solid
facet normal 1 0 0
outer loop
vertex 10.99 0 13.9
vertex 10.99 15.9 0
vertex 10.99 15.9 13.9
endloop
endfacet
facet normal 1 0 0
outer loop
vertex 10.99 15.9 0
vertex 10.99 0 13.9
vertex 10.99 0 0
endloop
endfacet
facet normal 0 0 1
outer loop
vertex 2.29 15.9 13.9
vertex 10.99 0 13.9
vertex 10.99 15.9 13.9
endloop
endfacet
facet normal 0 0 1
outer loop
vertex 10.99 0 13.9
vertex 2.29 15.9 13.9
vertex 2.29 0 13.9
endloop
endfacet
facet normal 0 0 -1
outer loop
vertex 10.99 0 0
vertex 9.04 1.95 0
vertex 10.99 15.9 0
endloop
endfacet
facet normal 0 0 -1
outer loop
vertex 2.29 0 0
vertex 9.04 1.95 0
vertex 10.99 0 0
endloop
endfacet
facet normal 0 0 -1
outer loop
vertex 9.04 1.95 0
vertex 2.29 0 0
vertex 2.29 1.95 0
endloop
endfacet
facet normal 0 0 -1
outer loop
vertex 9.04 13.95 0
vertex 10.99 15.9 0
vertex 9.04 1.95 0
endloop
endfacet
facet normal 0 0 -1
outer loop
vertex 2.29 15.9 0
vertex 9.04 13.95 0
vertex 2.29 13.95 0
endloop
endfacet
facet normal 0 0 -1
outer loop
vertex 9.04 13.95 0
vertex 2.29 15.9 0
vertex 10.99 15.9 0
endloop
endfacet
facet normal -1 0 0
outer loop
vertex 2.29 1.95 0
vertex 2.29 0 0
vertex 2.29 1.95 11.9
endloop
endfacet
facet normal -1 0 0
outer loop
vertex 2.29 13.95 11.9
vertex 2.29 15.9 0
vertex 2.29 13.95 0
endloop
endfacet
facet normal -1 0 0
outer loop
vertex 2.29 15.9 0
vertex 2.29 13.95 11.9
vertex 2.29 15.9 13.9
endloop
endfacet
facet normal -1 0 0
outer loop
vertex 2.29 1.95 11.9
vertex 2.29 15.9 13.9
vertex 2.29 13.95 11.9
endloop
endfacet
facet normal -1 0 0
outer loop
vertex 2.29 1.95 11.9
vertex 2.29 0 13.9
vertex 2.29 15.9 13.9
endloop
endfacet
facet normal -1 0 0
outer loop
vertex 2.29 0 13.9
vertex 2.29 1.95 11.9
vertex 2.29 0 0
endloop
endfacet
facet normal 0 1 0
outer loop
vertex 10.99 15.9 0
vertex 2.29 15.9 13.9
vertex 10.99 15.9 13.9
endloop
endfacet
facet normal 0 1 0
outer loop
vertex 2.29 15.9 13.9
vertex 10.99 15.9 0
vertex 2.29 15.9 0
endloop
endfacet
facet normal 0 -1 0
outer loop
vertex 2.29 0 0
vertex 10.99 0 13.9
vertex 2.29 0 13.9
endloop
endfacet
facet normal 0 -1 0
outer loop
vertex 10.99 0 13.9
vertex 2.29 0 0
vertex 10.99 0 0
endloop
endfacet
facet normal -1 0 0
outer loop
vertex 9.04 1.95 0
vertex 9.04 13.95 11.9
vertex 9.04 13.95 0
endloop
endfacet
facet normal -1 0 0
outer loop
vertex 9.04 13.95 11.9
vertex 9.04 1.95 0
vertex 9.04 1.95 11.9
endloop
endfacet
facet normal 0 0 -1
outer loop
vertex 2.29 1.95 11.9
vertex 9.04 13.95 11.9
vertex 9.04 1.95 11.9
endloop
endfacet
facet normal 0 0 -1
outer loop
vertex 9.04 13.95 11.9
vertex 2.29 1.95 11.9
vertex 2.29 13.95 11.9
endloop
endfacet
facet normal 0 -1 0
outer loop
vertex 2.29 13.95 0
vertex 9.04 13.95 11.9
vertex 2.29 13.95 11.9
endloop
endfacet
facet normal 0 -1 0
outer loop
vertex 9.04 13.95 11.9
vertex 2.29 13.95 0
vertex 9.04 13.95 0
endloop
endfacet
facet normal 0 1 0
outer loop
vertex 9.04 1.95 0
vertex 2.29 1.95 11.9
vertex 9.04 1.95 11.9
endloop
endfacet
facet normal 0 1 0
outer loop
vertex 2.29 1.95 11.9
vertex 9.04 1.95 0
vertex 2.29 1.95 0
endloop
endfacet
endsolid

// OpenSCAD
$fn = 70;
recBtnEncl();
module recBtnEncl() {
    union() {
        difference() {
            translate([0, 0, -2]) {
                // cube is receiver border imitation
                //cube([2.29, 11.9 +4 , 11.9 + 4]);
            }
            cut(2.29, 0, 0);
        }
        box(2.29, 0, 0);
    }
}

module cut(xpos, ypos, zpos) {
    btnWH = 11.9;
    union() {
        translate ([xpos, ypos, zpos]) {
            translate([-1.5, 2, 0]) {
                translate([0, 0, -0.3]) {
                    cube([1.5, btnWH, btnWH + 0.6]);
                }
                translate([-0.8, 5.95, 5.95]) {
                        rotate([0, 90, 0]) {
                            cylinder(h = 2.29, r = 2.6);
                    }
                }
            }
        }
    }
}

module box(xpos, ypos, zpos) {
    translate([xpos, ypos, zpos]) {
        difference() {
            // 2 is button enclousure width
            cube([6.7 + 2, 11.9 + 4, 11.9 + 2]);
            translate([-0.05, 2 - 0.05, 0]) {
                cube([6.7 + 0.1, 11.9 + 0.1, 11.9]);
            }
        }
    }
}
